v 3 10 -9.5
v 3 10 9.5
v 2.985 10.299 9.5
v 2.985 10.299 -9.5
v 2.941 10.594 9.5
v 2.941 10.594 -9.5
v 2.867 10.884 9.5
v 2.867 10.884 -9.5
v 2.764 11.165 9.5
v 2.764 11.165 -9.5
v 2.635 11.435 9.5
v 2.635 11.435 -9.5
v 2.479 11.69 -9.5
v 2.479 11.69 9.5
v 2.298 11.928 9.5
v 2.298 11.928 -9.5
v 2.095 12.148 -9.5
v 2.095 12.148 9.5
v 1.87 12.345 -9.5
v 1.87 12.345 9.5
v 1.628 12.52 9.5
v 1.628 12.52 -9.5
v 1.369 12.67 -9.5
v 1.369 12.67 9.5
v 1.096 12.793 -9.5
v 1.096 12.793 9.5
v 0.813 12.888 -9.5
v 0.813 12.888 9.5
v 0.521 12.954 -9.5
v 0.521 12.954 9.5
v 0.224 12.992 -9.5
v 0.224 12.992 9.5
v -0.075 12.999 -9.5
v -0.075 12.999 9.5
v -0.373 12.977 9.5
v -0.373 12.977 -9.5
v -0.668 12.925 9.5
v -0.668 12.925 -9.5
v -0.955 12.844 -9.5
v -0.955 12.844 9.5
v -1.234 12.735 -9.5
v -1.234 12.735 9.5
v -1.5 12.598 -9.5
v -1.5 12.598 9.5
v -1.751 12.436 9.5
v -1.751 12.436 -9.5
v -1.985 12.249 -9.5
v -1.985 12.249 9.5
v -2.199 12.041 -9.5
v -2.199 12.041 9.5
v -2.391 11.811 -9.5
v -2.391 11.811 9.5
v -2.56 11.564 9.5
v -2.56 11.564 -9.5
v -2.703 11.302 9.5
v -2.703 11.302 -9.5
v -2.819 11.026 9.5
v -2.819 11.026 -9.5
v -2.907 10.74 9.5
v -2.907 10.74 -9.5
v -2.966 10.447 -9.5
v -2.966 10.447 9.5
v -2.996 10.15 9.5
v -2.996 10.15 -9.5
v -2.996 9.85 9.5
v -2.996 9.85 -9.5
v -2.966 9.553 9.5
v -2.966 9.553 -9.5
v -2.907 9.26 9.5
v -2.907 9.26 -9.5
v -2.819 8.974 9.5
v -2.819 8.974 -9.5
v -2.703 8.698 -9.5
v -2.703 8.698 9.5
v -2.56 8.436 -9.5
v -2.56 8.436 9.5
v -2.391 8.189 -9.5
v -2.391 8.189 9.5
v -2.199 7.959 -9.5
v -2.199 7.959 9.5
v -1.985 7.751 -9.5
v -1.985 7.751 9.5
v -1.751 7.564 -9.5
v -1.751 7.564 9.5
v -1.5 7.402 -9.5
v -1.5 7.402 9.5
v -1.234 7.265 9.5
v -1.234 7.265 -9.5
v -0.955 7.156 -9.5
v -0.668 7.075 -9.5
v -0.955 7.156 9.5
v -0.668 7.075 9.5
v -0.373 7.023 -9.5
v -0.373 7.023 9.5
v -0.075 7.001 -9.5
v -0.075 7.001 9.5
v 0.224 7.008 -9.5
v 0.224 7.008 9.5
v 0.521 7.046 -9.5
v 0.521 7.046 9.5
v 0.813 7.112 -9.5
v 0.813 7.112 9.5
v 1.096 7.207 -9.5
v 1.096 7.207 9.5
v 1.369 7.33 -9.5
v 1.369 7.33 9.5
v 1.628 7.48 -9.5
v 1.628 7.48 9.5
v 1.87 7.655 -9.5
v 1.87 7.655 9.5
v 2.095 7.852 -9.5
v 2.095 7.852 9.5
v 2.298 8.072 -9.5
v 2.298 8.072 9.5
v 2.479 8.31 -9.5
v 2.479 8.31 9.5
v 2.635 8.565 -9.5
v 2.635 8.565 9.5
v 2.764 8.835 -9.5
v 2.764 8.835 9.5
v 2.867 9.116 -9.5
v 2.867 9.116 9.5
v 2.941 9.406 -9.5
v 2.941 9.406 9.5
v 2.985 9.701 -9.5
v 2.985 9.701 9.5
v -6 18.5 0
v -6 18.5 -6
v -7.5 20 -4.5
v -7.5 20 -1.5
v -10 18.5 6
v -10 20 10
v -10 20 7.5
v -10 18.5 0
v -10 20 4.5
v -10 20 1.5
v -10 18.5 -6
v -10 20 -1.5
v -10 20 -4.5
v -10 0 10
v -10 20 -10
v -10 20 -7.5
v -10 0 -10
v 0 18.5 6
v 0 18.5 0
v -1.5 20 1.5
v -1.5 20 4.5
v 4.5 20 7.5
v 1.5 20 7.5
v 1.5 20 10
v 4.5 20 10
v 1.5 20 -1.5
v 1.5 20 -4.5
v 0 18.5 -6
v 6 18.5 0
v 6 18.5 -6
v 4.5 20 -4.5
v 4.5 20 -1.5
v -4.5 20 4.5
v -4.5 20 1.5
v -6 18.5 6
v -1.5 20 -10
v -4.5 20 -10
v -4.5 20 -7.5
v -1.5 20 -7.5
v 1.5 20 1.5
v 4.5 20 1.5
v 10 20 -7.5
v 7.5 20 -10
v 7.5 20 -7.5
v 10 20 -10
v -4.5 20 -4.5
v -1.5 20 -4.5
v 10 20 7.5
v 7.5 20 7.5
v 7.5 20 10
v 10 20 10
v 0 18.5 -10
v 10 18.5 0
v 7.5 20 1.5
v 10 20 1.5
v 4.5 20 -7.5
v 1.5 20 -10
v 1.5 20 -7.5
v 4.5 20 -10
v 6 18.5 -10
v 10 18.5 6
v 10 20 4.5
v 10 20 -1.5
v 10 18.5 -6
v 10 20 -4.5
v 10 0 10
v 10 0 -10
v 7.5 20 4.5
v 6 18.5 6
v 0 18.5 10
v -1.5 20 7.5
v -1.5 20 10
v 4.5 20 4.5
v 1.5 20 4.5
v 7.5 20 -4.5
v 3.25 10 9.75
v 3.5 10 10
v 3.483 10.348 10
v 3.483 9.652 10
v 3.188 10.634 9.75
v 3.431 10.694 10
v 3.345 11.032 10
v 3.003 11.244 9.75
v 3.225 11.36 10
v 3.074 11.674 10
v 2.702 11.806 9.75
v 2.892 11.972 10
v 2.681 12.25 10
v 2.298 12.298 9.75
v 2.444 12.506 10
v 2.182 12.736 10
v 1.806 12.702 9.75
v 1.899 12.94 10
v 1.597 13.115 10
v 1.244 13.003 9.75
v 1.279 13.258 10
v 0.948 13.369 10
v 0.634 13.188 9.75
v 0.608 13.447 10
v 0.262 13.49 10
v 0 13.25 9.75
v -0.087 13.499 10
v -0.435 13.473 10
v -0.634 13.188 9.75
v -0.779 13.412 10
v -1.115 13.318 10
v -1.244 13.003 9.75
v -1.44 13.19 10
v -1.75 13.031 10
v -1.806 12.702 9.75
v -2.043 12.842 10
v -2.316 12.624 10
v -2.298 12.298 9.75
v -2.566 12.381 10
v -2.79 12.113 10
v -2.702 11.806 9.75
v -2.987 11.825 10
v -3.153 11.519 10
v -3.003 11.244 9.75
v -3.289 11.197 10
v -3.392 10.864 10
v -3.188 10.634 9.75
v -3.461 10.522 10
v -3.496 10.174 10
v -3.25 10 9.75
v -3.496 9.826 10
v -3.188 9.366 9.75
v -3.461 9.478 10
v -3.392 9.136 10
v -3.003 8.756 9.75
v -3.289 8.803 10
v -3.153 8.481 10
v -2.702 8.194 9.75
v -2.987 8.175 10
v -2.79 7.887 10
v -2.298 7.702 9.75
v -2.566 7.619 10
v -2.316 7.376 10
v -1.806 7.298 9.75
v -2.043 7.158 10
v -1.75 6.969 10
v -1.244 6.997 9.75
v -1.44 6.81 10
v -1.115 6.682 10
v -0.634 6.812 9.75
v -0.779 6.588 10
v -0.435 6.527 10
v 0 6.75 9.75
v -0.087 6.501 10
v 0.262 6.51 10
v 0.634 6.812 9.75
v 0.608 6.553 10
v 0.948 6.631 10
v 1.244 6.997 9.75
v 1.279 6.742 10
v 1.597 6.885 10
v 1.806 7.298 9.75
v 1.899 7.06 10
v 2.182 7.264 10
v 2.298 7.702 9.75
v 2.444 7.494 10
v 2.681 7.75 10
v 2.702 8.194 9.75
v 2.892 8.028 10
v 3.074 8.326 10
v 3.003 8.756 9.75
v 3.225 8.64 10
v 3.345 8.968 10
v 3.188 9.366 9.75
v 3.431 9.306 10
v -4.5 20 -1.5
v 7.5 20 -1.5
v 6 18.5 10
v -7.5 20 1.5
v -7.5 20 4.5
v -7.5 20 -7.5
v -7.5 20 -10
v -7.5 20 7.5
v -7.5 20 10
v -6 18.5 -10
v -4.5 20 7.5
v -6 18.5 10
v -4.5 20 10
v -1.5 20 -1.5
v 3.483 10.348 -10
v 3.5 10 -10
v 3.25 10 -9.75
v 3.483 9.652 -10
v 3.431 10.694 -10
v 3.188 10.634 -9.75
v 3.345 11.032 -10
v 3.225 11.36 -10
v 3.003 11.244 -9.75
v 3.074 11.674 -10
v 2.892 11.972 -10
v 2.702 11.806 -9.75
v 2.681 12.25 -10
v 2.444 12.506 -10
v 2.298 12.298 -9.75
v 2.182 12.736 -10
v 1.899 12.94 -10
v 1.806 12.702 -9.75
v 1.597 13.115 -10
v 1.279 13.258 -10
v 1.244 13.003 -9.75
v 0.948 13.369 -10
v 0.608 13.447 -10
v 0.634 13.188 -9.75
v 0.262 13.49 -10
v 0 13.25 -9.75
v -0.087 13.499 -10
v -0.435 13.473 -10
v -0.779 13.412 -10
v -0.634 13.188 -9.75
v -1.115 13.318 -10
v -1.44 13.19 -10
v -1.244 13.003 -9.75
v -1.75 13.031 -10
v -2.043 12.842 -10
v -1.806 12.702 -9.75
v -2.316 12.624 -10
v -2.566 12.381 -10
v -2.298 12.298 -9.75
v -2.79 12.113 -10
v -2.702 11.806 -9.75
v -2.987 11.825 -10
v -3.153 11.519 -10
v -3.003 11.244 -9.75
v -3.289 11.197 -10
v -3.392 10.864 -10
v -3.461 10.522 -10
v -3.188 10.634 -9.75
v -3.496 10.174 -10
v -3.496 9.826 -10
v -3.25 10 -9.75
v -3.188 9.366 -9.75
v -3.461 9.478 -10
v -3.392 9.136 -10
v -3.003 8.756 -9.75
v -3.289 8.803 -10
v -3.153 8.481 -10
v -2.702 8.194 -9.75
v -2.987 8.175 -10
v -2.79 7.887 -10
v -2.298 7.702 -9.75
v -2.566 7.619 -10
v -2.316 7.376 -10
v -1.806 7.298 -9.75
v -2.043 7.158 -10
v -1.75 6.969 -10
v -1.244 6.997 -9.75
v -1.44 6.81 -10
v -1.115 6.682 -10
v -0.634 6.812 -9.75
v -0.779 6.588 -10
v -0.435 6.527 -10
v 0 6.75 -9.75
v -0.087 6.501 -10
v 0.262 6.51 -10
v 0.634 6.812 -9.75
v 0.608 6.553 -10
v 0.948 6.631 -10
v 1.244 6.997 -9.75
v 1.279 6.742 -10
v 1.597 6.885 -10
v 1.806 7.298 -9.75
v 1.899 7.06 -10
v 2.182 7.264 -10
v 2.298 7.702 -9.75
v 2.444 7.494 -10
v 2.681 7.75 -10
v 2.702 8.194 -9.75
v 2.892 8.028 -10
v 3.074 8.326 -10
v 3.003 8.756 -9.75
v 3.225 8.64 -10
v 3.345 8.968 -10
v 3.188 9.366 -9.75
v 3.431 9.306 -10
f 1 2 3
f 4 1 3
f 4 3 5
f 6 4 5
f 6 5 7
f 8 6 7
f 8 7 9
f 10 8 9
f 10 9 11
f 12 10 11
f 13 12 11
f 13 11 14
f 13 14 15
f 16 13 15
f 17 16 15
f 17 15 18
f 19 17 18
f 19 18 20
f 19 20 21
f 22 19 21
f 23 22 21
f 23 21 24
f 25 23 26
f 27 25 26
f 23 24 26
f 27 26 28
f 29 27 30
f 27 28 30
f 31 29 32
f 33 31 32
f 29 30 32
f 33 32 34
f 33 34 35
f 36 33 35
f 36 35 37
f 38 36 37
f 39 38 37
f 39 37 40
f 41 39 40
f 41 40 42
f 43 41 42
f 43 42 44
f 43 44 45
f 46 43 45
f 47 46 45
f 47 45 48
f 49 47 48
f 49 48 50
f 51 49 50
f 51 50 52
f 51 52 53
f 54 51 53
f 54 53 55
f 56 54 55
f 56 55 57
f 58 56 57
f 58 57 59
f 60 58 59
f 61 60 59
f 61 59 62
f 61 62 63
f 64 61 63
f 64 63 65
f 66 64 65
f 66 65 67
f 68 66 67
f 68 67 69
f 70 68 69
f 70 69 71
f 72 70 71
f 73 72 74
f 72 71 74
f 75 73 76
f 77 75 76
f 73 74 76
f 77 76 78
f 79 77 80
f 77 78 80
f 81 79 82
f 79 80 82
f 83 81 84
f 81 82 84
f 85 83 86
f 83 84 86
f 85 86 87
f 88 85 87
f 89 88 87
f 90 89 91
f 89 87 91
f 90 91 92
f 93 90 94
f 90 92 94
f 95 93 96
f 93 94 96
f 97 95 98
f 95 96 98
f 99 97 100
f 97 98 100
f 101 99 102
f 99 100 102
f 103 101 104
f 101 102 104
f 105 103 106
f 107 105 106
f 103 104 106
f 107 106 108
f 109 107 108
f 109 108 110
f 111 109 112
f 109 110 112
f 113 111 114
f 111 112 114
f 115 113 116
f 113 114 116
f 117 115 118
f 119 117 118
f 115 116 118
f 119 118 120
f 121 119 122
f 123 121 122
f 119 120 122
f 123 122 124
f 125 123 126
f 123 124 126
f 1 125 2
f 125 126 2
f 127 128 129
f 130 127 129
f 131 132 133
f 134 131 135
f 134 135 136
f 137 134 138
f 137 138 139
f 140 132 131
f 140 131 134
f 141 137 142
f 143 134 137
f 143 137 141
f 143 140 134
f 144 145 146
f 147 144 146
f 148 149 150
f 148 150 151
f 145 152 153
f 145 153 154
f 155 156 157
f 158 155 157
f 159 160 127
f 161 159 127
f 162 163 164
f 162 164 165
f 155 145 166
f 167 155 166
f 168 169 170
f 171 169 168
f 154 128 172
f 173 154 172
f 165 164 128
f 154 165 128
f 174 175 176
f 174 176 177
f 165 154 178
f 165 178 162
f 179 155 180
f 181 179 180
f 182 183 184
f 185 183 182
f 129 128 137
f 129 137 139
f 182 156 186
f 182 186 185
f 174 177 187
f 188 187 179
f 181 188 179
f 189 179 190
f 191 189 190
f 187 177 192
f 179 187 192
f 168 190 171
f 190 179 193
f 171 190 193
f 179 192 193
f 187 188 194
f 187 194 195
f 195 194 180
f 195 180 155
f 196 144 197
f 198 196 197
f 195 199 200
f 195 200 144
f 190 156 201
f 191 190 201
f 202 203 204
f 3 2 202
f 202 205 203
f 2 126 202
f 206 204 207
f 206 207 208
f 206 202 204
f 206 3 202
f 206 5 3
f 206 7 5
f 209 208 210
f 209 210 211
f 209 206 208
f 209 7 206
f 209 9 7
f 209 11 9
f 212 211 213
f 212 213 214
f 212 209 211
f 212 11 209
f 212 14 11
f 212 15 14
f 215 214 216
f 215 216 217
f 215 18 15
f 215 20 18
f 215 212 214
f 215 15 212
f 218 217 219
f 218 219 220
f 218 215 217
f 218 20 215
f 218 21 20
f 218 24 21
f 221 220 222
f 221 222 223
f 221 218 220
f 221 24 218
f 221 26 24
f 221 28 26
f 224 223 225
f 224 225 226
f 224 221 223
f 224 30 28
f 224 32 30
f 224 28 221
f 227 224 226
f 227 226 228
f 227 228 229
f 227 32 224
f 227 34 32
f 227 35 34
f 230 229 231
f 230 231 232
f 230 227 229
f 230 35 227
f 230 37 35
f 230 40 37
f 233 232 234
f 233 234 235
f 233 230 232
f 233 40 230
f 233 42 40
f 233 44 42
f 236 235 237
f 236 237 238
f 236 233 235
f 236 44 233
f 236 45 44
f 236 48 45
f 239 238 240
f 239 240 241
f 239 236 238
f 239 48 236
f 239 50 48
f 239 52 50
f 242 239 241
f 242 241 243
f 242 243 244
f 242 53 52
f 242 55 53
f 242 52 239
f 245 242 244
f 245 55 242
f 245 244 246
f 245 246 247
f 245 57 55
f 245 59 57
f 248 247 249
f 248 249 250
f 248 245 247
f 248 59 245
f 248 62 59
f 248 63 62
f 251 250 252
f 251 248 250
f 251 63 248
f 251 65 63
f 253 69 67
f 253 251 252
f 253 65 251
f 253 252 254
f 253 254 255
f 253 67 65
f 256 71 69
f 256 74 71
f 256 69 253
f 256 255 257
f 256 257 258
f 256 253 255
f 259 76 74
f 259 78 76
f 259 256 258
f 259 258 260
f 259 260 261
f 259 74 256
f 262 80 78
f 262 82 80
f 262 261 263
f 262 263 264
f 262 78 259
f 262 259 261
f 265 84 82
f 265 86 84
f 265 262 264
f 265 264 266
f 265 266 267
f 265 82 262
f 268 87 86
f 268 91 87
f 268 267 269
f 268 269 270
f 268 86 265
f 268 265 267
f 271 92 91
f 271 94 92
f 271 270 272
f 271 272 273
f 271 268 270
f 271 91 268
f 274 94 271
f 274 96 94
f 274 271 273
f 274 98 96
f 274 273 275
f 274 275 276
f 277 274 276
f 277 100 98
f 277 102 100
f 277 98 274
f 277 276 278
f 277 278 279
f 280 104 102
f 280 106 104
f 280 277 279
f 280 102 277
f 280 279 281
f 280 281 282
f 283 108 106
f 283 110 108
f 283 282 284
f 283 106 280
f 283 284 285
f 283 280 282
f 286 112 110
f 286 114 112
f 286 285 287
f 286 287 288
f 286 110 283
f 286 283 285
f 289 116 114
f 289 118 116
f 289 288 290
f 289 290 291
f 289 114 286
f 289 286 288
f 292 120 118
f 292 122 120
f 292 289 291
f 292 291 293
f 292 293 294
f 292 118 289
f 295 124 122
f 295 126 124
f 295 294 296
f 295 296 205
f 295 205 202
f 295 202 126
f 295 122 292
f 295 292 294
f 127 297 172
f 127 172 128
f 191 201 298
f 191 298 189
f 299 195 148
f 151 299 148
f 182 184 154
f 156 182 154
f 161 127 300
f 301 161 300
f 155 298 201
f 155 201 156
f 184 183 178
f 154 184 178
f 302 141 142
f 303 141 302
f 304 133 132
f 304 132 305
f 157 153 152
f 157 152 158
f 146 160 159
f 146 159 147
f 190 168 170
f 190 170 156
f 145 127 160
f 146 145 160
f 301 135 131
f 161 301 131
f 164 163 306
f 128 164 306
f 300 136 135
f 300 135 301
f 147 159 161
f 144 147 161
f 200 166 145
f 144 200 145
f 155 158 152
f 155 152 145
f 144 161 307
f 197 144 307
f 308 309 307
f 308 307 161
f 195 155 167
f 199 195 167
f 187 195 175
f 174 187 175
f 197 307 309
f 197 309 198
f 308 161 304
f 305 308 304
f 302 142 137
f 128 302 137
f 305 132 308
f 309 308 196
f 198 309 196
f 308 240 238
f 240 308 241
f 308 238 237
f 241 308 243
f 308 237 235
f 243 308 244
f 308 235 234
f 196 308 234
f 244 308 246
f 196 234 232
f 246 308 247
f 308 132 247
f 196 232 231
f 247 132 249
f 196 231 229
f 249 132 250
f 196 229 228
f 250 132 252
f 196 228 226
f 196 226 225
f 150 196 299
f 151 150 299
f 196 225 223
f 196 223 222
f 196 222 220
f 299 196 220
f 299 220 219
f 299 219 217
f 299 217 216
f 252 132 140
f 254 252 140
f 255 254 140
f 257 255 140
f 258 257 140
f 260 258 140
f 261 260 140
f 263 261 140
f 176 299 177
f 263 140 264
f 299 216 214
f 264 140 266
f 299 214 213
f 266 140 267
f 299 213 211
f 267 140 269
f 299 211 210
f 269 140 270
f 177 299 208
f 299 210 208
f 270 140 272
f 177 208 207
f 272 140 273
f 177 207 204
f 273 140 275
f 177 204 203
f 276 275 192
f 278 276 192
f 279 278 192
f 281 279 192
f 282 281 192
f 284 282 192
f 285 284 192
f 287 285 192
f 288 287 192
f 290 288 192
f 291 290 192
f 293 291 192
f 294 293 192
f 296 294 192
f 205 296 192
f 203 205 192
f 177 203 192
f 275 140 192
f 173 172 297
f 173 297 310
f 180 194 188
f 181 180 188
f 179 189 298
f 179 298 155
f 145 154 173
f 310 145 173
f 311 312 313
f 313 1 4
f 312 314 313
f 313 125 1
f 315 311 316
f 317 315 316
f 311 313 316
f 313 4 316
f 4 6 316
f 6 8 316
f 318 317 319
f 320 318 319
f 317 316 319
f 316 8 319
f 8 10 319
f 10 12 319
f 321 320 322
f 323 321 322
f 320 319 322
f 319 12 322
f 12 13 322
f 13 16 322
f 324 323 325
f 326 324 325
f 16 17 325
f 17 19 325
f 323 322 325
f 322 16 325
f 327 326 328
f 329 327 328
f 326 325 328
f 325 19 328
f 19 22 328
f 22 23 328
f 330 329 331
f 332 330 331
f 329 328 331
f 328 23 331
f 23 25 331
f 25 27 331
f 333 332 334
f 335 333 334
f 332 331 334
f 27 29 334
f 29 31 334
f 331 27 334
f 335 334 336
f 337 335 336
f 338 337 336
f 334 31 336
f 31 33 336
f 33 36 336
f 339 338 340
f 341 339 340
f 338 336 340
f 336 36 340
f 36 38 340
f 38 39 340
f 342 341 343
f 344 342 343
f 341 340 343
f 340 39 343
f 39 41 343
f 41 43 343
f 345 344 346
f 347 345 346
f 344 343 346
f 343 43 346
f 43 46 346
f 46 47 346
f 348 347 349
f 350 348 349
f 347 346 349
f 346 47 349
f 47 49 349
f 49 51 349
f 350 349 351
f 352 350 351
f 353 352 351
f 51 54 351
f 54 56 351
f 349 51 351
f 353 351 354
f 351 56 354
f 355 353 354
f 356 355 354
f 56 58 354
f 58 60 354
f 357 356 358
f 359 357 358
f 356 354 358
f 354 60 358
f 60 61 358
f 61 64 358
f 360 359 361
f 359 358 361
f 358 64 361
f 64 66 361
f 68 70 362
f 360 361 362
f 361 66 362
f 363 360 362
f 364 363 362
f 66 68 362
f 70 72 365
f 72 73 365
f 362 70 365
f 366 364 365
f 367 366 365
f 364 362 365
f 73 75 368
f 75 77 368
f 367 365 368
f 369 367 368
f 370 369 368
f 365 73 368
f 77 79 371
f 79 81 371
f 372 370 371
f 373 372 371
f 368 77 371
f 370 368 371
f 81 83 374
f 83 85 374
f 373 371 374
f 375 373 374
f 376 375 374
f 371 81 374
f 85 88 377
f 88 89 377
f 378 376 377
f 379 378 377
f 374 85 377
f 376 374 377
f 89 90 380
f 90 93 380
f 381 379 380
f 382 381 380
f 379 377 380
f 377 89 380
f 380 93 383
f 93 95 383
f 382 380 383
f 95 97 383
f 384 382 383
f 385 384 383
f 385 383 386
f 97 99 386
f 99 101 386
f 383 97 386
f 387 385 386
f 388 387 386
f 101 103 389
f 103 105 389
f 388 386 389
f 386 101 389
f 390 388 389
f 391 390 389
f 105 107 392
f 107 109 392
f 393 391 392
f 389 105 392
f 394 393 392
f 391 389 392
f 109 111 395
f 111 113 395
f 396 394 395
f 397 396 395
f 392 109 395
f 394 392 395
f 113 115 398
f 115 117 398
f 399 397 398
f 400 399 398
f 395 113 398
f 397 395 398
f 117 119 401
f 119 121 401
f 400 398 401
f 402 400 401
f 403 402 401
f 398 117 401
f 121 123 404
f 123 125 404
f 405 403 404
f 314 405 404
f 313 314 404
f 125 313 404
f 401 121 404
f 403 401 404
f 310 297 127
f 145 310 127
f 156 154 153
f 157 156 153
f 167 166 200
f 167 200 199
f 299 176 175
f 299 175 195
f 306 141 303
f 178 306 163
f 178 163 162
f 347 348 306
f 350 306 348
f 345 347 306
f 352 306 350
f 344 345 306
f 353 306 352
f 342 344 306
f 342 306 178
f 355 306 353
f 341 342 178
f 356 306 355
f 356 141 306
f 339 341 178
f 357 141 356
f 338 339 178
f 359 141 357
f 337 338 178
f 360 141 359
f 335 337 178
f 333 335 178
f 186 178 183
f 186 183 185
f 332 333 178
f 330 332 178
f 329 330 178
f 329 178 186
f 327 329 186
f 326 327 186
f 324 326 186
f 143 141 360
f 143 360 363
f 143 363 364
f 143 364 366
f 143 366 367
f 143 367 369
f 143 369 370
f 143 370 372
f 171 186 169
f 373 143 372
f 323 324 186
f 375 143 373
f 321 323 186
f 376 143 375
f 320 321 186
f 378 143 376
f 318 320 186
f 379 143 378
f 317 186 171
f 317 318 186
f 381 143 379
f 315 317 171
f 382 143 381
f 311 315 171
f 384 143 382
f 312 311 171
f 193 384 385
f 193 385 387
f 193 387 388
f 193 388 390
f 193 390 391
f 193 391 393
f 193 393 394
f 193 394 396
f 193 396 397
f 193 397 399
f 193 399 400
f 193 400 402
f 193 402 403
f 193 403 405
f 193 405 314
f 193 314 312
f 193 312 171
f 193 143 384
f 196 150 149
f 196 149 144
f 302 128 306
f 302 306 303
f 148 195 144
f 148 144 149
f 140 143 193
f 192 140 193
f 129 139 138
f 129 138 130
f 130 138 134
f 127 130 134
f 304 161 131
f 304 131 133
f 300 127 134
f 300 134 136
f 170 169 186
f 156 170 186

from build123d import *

# Parameters (mm, degrees)
SKETCH1_W               = 20
SKETCH1_H               = 20
BOSS_EXTRUDE1_DEPTH     = 20
SKETCH2_R               = 3
CUT_EXTRUDE1_DEPTH      = 21
CHAMFER1_SIZE           = 0.5
CUT_EXTRUDE2_DEPTH      = 11
CUT_EXTRUDE2_DEPTH_BACK = 11
CUT_EXTRUDE3_DEPTH      = 11
CUT_EXTRUDE3_DEPTH_BACK = 11


with BuildPart() as part:
    # Sketch1 → Boss-Extrude1 (new body)
    with BuildSketch(Plane(origin=(0, 0, 0), x_dir=(1, 0, 0), z_dir=(0, 1, 0))):
        Rectangle(SKETCH1_W, SKETCH1_H)
    extrude(amount=BOSS_EXTRUDE1_DEPTH)

    # Sketch2 → Cut-Extrude1 (cut, through all)
    with BuildSketch(Plane.XY.offset(10)):
        with Locations((0, 10)):
            Circle(SKETCH2_R)
    extrude(amount=-CUT_EXTRUDE1_DEPTH, mode=Mode.SUBTRACT)

    # Chamfer1
    chamfer1_edges = [part.edges().sort_by_distance(p)[0] for p in [
        (-3, 10, -10),
        (-3, 10, 10),
    ]]
    chamfer(chamfer1_edges, length=CHAMFER1_SIZE)

    # Sketch3 → Cut-Extrude2 (cut, two sides)
    with BuildSketch(Plane.XY) as cut_extrude2_sk:
        Polygon((-3.5, 21), (-6, 18.5), (-8.5, 21), align=None)
        Polygon((2.5, 21), (0, 18.5), (-2.5, 21), align=None)
        Polygon((8.5, 21), (6, 18.5), (3.5, 21), align=None)
    extrude(amount=CUT_EXTRUDE2_DEPTH, mode=Mode.SUBTRACT)
    extrude(cut_extrude2_sk.sketch, amount=-CUT_EXTRUDE2_DEPTH_BACK, mode=Mode.SUBTRACT)

    # Sketch4 → Cut-Extrude3 (cut, two sides)
    with BuildSketch(Plane(origin=(0, 0, 0), x_dir=(0, 0, -1), z_dir=(1, 0, 0))) as cut_extrude3_sk:
        Polygon((-3.5, 21), (-6, 18.5), (-8.5, 21), align=None)
        Polygon((2.5, 21), (0, 18.5), (-2.5, 21), align=None)
        Polygon((8.5, 21), (6, 18.5), (3.5, 21), align=None)
    extrude(amount=CUT_EXTRUDE3_DEPTH, mode=Mode.SUBTRACT)
    extrude(cut_extrude3_sk.sketch, amount=-CUT_EXTRUDE3_DEPTH_BACK, mode=Mode.SUBTRACT)


solid = part.part
